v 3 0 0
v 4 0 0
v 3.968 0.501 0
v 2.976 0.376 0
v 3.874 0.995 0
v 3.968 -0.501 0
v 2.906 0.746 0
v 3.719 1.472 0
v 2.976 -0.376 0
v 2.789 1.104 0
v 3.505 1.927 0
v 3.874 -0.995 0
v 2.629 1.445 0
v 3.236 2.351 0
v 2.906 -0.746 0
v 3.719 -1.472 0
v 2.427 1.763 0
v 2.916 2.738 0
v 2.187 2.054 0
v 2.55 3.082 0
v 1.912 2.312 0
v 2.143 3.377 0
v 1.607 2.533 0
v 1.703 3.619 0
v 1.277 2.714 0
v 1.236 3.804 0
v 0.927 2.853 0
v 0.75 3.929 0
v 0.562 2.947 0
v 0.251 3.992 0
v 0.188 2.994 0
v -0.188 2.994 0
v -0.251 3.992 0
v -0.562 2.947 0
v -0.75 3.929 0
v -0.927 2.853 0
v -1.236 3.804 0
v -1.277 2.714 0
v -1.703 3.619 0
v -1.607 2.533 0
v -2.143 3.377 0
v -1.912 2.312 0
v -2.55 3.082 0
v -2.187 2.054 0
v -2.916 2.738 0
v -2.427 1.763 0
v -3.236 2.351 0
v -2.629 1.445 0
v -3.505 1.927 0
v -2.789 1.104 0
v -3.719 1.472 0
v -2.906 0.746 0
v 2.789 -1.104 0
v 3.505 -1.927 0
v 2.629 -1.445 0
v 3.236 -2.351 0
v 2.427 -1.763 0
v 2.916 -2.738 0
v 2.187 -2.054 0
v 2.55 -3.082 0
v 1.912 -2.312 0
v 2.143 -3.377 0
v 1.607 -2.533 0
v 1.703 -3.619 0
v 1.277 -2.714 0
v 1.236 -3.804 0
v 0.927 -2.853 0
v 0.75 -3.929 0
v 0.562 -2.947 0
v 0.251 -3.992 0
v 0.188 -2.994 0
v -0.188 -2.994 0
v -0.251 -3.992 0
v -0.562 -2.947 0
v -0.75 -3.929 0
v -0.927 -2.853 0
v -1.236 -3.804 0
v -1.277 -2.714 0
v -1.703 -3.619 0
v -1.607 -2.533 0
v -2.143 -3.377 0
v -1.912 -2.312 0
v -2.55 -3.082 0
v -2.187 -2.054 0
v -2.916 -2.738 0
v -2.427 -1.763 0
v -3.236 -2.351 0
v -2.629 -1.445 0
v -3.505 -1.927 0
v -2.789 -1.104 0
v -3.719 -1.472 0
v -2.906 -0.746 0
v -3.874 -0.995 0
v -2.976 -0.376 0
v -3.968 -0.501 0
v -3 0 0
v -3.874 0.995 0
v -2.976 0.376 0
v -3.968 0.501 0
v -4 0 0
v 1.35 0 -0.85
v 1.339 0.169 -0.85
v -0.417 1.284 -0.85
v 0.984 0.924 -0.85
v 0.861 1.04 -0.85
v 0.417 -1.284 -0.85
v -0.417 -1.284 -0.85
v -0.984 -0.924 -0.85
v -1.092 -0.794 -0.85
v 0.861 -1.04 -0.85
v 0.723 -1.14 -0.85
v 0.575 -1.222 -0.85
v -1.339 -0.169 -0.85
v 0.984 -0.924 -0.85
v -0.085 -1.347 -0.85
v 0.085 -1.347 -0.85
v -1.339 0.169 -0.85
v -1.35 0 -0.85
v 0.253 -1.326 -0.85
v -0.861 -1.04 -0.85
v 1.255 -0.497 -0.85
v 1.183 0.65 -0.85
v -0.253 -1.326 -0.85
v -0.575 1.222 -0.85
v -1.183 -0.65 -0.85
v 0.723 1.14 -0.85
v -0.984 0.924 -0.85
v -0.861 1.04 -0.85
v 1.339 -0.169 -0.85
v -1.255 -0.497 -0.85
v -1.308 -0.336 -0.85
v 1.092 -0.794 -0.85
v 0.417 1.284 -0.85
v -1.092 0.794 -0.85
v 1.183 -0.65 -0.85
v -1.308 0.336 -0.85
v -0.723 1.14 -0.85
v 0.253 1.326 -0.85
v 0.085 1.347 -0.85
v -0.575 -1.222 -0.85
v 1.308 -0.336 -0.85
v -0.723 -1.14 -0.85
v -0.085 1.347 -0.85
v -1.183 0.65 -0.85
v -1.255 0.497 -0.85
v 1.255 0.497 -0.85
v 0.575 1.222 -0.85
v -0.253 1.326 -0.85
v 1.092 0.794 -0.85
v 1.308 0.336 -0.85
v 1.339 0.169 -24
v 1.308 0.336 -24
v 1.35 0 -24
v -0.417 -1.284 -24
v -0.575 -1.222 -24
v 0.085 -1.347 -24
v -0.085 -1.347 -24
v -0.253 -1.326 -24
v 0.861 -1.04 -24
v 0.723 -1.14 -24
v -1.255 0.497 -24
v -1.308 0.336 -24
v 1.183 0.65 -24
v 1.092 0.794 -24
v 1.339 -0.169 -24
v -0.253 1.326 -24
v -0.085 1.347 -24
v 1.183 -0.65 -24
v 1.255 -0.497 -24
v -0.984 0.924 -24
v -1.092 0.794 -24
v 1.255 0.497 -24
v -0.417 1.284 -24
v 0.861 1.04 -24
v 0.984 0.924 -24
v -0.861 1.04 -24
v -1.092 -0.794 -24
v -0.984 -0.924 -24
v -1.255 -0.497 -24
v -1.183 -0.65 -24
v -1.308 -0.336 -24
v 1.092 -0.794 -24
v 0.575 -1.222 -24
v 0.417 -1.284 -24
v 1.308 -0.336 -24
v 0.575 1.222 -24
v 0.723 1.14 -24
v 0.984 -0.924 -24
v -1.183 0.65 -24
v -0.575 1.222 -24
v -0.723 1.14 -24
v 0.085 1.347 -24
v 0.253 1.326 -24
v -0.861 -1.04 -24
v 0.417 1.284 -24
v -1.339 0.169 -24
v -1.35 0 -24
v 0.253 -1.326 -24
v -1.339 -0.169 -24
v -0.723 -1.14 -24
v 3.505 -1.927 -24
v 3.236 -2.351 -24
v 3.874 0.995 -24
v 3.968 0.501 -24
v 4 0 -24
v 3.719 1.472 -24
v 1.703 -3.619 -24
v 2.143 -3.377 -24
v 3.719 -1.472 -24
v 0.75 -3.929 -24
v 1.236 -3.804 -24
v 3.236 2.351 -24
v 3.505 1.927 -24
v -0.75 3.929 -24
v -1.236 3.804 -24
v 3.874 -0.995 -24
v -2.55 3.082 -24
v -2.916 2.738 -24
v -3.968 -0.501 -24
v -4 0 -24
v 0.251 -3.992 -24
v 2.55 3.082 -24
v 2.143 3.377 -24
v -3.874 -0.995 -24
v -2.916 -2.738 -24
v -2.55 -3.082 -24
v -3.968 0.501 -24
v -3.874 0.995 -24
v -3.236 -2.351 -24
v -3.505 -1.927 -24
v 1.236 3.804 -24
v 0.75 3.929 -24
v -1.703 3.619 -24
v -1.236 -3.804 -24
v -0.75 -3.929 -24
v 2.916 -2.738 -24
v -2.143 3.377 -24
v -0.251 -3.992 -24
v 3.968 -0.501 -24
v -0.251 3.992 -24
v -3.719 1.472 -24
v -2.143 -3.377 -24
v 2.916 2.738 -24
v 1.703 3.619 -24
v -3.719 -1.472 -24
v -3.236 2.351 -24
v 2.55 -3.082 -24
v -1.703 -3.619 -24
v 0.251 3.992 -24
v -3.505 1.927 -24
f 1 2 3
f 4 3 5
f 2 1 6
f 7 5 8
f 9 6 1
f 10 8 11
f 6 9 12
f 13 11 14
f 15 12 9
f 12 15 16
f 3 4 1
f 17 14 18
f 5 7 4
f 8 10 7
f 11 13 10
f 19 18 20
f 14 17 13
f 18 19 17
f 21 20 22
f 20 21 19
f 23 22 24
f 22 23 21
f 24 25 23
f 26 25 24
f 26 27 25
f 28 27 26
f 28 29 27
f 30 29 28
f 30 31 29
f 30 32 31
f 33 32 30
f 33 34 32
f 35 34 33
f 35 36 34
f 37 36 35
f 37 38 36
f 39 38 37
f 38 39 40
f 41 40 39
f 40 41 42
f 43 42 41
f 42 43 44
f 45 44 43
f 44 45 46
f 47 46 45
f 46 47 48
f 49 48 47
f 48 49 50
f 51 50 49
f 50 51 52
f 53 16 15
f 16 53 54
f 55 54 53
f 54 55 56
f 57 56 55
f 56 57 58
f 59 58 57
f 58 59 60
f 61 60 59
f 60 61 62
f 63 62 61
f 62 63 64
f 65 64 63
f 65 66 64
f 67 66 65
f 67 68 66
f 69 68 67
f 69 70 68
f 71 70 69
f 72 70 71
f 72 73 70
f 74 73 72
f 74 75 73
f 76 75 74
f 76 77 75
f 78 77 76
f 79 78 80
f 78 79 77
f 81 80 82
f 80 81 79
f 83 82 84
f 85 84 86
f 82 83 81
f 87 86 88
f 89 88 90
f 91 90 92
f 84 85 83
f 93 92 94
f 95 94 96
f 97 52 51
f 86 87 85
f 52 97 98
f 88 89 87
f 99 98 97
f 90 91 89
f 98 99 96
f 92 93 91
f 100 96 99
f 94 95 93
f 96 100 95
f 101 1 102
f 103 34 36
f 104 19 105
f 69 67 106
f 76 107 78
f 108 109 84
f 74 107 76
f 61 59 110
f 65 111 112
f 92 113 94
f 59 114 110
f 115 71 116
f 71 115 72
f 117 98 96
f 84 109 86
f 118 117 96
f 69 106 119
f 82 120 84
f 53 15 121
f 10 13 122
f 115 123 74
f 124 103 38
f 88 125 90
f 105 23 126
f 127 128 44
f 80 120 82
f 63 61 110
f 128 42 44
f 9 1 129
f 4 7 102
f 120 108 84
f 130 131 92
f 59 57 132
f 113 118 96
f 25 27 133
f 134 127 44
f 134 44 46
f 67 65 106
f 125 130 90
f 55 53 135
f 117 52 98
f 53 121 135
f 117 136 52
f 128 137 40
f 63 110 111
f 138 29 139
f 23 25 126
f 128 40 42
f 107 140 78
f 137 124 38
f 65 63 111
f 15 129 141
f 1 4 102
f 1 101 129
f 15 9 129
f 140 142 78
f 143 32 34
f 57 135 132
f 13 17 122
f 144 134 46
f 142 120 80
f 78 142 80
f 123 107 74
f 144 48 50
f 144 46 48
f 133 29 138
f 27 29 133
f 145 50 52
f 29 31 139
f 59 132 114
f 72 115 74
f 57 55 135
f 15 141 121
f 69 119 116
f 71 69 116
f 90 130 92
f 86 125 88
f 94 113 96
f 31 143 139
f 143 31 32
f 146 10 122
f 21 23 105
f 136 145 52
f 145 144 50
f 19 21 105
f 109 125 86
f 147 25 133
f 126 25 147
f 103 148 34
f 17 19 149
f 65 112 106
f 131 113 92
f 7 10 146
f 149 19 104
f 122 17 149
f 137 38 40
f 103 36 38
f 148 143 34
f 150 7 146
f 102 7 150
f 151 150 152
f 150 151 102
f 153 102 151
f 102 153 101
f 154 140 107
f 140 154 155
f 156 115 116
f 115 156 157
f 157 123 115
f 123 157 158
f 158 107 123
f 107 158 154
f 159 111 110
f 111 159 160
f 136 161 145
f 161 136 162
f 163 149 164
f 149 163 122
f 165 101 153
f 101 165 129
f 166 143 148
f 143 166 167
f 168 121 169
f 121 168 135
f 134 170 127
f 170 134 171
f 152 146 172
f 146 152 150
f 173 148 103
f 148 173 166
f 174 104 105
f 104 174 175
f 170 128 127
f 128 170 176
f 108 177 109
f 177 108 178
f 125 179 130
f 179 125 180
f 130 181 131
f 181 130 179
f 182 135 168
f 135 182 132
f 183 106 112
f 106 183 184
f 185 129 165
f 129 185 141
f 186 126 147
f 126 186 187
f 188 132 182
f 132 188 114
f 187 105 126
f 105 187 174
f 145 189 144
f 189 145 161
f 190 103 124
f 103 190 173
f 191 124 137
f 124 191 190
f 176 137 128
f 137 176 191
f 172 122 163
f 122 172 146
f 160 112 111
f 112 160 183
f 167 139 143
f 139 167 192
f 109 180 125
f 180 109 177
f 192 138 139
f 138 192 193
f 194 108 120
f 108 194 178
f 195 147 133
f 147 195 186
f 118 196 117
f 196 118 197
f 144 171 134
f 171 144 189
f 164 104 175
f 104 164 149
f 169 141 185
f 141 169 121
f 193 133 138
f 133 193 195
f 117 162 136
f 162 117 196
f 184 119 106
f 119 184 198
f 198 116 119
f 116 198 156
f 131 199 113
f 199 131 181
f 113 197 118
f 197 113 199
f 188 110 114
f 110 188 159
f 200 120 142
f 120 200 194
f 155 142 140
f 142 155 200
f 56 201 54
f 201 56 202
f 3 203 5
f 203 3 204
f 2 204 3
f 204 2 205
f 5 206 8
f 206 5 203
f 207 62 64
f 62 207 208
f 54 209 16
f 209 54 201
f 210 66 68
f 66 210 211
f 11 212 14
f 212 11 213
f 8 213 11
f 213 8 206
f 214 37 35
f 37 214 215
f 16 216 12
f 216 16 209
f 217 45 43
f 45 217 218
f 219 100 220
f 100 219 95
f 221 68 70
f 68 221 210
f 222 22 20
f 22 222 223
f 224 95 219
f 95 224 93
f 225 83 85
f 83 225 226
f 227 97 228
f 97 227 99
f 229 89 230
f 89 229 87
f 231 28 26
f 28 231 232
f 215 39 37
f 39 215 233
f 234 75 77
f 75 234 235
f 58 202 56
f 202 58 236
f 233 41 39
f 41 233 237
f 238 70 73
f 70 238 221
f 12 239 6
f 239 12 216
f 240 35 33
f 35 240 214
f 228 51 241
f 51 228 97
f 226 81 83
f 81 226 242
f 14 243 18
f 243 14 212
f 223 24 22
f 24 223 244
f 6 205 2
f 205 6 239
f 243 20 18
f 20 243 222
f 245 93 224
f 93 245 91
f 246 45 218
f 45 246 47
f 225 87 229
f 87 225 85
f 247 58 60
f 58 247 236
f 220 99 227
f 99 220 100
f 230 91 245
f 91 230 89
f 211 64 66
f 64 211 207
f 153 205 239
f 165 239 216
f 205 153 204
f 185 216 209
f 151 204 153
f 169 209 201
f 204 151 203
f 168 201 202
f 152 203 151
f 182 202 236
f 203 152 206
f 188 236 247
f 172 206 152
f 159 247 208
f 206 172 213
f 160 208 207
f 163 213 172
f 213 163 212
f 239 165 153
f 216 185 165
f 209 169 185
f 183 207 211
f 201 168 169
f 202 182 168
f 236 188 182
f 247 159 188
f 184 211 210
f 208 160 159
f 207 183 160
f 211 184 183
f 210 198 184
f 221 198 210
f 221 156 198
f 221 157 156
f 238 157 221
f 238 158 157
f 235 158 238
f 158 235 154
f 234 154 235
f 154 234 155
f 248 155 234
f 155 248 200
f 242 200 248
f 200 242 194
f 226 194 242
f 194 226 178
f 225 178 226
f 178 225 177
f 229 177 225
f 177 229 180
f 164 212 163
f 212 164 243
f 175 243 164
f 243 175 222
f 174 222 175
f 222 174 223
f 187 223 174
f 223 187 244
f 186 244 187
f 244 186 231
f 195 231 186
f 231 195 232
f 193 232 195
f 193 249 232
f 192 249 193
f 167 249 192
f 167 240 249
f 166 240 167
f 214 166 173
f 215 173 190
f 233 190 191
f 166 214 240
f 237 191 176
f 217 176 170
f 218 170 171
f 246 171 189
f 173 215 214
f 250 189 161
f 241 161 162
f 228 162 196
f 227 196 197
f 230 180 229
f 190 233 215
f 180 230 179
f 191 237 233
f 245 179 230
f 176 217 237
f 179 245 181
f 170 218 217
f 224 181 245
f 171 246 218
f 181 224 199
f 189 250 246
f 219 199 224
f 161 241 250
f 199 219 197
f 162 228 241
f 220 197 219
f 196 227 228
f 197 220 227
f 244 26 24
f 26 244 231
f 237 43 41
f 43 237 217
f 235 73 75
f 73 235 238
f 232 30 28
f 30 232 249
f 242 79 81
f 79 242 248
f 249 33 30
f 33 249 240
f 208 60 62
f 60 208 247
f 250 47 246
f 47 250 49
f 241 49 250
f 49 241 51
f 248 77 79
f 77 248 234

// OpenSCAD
$fn = 50;

difference() {
	union() {
		translate(v = [0, 0, -24.0]) {
			cylinder(h = 24, r = 4.0);
		}
	}
	union() {
		translate(v = [0, 0, 0]) {
			rotate(a = [0, 0, 0]) {
				difference() {
					union() {
						translate(v = [0, 0, -27.0]) {
							cylinder(h = 27, r = 1.0);
						}
						translate(v = [0, 0, -0.85]) {
							cylinder(h = 0.85, r1 = 1.35, r2 = 3.0);
						}
						translate(v = [0, 0, -27.0]) {
							cylinder(h = 27, r = 1.35);
						}
						translate(v = [0, 0, -27.0]) {
							cylinder(h = 27, r = 1.0);
						}
					}
					union();
				}
			}
		}
	}
}
